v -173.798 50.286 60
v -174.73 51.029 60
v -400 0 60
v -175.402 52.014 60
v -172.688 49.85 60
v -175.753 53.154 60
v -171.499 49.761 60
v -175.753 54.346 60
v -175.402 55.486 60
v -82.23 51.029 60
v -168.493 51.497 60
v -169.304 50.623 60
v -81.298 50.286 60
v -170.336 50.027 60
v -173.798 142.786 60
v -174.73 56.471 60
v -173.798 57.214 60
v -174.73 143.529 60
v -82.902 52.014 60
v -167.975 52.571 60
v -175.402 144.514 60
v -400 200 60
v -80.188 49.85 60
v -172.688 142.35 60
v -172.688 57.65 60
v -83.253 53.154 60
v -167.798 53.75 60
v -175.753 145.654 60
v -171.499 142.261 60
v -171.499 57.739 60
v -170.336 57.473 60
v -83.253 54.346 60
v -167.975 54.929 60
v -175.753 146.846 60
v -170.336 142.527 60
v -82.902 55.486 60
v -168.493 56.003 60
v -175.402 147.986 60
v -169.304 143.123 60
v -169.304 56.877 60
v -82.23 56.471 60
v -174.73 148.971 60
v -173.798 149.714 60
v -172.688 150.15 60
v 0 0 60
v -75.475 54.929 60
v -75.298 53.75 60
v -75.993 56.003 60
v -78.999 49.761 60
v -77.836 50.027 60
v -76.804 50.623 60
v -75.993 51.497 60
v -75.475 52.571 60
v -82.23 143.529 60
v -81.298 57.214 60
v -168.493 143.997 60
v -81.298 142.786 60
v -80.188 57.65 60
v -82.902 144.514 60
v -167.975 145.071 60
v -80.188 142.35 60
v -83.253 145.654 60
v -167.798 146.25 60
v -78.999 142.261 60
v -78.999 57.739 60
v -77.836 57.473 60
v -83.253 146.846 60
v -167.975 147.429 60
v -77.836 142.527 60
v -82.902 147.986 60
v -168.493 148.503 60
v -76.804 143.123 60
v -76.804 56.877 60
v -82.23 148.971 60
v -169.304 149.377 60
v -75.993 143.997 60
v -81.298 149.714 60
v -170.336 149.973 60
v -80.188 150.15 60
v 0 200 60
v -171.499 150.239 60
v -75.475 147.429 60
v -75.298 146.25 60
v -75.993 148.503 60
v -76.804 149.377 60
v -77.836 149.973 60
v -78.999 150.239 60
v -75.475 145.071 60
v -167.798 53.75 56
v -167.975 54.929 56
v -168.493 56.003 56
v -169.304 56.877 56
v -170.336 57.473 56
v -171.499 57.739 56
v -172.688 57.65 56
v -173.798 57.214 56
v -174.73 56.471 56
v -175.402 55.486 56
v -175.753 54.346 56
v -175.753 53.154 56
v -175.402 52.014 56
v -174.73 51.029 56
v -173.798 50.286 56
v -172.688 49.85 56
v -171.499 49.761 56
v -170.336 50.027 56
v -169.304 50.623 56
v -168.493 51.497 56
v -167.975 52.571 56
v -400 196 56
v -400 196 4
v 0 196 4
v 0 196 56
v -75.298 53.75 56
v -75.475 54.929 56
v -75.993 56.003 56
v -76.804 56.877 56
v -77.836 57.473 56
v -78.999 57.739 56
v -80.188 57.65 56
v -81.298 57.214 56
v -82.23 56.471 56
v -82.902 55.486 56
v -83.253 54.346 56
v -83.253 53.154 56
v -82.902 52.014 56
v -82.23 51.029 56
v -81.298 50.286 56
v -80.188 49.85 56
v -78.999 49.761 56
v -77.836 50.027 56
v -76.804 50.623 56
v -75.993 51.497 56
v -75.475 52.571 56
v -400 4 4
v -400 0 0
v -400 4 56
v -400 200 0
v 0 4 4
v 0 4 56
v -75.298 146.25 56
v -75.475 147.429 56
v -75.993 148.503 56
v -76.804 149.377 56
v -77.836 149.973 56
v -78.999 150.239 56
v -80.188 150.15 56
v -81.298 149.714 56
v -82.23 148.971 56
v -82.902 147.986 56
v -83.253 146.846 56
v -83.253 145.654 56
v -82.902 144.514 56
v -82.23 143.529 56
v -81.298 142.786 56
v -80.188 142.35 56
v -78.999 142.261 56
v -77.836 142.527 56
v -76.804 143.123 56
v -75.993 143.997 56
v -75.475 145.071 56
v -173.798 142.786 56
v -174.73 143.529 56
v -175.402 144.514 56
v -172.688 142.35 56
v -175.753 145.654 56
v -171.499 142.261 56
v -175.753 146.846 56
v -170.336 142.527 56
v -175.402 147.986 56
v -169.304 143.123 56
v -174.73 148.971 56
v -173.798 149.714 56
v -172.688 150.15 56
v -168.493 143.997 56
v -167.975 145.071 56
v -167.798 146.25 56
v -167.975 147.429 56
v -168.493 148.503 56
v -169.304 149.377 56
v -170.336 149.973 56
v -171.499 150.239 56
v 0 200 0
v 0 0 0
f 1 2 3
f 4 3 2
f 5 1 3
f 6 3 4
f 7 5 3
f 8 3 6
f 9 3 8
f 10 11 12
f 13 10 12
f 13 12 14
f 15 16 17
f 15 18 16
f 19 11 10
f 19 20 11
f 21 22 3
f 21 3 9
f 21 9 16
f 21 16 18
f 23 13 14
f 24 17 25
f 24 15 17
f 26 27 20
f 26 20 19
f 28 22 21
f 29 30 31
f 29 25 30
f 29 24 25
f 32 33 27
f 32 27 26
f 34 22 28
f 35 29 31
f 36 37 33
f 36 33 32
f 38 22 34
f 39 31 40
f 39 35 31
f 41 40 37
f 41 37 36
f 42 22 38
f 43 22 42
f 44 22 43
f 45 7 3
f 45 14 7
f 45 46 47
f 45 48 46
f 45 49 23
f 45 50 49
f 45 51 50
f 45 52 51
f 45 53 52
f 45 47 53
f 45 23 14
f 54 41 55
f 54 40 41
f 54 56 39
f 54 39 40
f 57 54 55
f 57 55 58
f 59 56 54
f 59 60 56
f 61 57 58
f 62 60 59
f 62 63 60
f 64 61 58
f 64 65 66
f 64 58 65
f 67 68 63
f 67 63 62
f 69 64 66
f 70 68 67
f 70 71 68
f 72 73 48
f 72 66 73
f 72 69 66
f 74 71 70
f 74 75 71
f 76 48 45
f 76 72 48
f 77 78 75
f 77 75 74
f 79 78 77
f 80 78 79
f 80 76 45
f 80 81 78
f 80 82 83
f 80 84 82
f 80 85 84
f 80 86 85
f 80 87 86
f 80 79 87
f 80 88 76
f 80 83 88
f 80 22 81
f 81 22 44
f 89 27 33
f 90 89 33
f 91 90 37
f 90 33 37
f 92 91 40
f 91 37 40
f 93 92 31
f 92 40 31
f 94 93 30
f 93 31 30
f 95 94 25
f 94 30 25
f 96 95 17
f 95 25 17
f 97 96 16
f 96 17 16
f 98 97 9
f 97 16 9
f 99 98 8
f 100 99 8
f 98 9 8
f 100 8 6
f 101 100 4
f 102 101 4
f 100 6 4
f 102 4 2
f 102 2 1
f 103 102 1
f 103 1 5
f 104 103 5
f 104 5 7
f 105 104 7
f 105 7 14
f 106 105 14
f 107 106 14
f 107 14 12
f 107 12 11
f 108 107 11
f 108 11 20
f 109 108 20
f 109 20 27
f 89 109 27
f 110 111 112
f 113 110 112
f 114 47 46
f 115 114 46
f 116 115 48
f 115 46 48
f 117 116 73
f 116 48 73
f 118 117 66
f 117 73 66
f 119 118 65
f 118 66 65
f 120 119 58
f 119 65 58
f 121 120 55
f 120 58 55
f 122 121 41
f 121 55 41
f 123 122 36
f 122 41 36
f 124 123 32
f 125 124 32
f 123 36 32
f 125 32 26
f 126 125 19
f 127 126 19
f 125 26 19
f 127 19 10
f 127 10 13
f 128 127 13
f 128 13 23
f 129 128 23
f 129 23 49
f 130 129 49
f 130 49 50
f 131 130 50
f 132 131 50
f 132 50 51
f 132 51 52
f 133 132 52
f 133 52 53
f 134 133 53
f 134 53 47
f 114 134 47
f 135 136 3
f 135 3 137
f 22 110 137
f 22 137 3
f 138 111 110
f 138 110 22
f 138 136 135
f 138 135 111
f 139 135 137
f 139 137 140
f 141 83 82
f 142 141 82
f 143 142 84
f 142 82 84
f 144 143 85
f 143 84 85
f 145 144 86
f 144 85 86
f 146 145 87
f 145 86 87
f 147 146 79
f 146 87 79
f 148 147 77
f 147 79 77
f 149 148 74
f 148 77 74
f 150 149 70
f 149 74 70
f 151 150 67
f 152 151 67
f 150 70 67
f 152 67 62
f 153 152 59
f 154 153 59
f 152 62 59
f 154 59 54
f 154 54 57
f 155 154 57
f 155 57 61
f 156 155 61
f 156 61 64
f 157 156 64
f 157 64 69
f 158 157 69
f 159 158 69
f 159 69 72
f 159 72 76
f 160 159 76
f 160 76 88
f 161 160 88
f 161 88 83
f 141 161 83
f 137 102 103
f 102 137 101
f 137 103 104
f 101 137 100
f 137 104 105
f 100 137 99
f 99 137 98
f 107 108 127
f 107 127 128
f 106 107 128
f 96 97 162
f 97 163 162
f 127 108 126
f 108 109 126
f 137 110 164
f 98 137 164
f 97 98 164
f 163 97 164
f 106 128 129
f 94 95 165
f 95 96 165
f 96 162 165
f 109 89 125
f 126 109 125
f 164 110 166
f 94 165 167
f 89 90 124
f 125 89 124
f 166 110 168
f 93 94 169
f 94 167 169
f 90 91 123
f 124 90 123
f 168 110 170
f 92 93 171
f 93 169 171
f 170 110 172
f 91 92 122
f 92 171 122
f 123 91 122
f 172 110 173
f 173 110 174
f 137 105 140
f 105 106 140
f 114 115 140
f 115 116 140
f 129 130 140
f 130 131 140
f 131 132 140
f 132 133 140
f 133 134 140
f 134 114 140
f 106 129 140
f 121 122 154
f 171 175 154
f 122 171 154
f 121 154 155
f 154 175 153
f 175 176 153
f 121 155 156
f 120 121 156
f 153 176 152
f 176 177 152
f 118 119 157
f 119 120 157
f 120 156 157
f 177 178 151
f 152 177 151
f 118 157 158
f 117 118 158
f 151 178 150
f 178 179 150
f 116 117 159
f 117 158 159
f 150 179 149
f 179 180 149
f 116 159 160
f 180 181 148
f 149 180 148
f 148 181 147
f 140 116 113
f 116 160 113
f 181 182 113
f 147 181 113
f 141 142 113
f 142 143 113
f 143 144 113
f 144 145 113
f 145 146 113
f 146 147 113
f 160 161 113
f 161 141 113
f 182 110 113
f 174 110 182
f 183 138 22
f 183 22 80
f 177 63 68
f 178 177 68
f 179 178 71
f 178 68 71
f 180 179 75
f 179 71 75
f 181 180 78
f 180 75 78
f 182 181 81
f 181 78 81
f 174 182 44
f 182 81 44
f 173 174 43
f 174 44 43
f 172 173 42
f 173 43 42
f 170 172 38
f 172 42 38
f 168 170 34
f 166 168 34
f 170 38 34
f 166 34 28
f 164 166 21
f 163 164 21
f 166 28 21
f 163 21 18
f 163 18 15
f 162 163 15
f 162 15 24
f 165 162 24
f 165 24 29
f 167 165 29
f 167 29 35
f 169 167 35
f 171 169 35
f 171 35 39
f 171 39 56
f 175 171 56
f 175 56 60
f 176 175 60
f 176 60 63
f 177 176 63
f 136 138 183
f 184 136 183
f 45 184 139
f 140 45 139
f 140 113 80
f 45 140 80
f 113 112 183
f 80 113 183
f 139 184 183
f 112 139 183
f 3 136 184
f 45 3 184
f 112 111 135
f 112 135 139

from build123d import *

# Parameters (mm, degrees)
IZIM1_W                     = 400
IZIM1_H                     = 200
Y_KSEKLIK_EKSTR_ZYON2_DEPTH = 60
BO_ALTMA2_T                 = -4
KES_EKSTR_ZYON2_REACH       = 453.221
IZIM3_R                     = 4


with BuildPart() as part:
    # Çizim1 → Yükseklik-Ekstrüzyon2 (new body)
    with BuildSketch(Plane.XY):
        with Locations((-200, 100)):
            Rectangle(IZIM1_W, IZIM1_H)
    extrude(amount=Y_KSEKLIK_EKSTR_ZYON2_DEPTH)

    # İç Boşaltma2
    bo_altma2_openings = [part.faces().sort_by_distance(p)[0] for p in [
        (-400, 100, 30),
        (0, 100, 30),
    ]]
    offset(amount=BO_ALTMA2_T, openings=bo_altma2_openings, kind=Kind.INTERSECTION)

    # Çizim3 → Kes-Ekstrüzyon2 (cut, up to next)
    with BuildSketch(Plane.XY.offset(60), mode=Mode.PRIVATE) as kes_ekstr_zyon2_sk1:
        with Locations((-79.297757223, 146.25)):
            Circle(IZIM3_R)
    kes_ekstr_zyon2_tool1 = extrude(kes_ekstr_zyon2_sk1.sketch, amount=-KES_EKSTR_ZYON2_REACH, mode=Mode.PRIVATE) & part.part
    # Çizim3 → Kes-Ekstrüzyon2 (cut, up to next)
    with BuildSketch(Plane.XY.offset(60), mode=Mode.PRIVATE) as kes_ekstr_zyon2_sk2:
        with Locations((-171.797757223, 146.25)):
            Circle(IZIM3_R)
    kes_ekstr_zyon2_tool2 = extrude(kes_ekstr_zyon2_sk2.sketch, amount=-KES_EKSTR_ZYON2_REACH, mode=Mode.PRIVATE) & part.part
    # Çizim3 → Kes-Ekstrüzyon2 (cut, up to next)
    with BuildSketch(Plane.XY.offset(60), mode=Mode.PRIVATE) as kes_ekstr_zyon2_sk3:
        with Locations((-79.297757223, 53.75)):
            Circle(IZIM3_R)
    kes_ekstr_zyon2_tool3 = extrude(kes_ekstr_zyon2_sk3.sketch, amount=-KES_EKSTR_ZYON2_REACH, mode=Mode.PRIVATE) & part.part
    # Çizim3 → Kes-Ekstrüzyon2 (cut, up to next)
    with BuildSketch(Plane.XY.offset(60), mode=Mode.PRIVATE) as kes_ekstr_zyon2_sk4:
        with Locations((-171.797757223, 53.75)):
            Circle(IZIM3_R)
    kes_ekstr_zyon2_tool4 = extrude(kes_ekstr_zyon2_sk4.sketch, amount=-KES_EKSTR_ZYON2_REACH, mode=Mode.PRIVATE) & part.part
    add(kes_ekstr_zyon2_tool1.solids().sort_by_distance((-79.297757, 146.25, 60))[0], mode=Mode.SUBTRACT)
    add(kes_ekstr_zyon2_tool2.solids().sort_by_distance((-171.797757, 146.25, 60))[0], mode=Mode.SUBTRACT)
    add(kes_ekstr_zyon2_tool3.solids().sort_by_distance((-79.297757, 53.75, 60))[0], mode=Mode.SUBTRACT)
    add(kes_ekstr_zyon2_tool4.solids().sort_by_distance((-171.797757, 53.75, 60))[0], mode=Mode.SUBTRACT)


solid = part.part
